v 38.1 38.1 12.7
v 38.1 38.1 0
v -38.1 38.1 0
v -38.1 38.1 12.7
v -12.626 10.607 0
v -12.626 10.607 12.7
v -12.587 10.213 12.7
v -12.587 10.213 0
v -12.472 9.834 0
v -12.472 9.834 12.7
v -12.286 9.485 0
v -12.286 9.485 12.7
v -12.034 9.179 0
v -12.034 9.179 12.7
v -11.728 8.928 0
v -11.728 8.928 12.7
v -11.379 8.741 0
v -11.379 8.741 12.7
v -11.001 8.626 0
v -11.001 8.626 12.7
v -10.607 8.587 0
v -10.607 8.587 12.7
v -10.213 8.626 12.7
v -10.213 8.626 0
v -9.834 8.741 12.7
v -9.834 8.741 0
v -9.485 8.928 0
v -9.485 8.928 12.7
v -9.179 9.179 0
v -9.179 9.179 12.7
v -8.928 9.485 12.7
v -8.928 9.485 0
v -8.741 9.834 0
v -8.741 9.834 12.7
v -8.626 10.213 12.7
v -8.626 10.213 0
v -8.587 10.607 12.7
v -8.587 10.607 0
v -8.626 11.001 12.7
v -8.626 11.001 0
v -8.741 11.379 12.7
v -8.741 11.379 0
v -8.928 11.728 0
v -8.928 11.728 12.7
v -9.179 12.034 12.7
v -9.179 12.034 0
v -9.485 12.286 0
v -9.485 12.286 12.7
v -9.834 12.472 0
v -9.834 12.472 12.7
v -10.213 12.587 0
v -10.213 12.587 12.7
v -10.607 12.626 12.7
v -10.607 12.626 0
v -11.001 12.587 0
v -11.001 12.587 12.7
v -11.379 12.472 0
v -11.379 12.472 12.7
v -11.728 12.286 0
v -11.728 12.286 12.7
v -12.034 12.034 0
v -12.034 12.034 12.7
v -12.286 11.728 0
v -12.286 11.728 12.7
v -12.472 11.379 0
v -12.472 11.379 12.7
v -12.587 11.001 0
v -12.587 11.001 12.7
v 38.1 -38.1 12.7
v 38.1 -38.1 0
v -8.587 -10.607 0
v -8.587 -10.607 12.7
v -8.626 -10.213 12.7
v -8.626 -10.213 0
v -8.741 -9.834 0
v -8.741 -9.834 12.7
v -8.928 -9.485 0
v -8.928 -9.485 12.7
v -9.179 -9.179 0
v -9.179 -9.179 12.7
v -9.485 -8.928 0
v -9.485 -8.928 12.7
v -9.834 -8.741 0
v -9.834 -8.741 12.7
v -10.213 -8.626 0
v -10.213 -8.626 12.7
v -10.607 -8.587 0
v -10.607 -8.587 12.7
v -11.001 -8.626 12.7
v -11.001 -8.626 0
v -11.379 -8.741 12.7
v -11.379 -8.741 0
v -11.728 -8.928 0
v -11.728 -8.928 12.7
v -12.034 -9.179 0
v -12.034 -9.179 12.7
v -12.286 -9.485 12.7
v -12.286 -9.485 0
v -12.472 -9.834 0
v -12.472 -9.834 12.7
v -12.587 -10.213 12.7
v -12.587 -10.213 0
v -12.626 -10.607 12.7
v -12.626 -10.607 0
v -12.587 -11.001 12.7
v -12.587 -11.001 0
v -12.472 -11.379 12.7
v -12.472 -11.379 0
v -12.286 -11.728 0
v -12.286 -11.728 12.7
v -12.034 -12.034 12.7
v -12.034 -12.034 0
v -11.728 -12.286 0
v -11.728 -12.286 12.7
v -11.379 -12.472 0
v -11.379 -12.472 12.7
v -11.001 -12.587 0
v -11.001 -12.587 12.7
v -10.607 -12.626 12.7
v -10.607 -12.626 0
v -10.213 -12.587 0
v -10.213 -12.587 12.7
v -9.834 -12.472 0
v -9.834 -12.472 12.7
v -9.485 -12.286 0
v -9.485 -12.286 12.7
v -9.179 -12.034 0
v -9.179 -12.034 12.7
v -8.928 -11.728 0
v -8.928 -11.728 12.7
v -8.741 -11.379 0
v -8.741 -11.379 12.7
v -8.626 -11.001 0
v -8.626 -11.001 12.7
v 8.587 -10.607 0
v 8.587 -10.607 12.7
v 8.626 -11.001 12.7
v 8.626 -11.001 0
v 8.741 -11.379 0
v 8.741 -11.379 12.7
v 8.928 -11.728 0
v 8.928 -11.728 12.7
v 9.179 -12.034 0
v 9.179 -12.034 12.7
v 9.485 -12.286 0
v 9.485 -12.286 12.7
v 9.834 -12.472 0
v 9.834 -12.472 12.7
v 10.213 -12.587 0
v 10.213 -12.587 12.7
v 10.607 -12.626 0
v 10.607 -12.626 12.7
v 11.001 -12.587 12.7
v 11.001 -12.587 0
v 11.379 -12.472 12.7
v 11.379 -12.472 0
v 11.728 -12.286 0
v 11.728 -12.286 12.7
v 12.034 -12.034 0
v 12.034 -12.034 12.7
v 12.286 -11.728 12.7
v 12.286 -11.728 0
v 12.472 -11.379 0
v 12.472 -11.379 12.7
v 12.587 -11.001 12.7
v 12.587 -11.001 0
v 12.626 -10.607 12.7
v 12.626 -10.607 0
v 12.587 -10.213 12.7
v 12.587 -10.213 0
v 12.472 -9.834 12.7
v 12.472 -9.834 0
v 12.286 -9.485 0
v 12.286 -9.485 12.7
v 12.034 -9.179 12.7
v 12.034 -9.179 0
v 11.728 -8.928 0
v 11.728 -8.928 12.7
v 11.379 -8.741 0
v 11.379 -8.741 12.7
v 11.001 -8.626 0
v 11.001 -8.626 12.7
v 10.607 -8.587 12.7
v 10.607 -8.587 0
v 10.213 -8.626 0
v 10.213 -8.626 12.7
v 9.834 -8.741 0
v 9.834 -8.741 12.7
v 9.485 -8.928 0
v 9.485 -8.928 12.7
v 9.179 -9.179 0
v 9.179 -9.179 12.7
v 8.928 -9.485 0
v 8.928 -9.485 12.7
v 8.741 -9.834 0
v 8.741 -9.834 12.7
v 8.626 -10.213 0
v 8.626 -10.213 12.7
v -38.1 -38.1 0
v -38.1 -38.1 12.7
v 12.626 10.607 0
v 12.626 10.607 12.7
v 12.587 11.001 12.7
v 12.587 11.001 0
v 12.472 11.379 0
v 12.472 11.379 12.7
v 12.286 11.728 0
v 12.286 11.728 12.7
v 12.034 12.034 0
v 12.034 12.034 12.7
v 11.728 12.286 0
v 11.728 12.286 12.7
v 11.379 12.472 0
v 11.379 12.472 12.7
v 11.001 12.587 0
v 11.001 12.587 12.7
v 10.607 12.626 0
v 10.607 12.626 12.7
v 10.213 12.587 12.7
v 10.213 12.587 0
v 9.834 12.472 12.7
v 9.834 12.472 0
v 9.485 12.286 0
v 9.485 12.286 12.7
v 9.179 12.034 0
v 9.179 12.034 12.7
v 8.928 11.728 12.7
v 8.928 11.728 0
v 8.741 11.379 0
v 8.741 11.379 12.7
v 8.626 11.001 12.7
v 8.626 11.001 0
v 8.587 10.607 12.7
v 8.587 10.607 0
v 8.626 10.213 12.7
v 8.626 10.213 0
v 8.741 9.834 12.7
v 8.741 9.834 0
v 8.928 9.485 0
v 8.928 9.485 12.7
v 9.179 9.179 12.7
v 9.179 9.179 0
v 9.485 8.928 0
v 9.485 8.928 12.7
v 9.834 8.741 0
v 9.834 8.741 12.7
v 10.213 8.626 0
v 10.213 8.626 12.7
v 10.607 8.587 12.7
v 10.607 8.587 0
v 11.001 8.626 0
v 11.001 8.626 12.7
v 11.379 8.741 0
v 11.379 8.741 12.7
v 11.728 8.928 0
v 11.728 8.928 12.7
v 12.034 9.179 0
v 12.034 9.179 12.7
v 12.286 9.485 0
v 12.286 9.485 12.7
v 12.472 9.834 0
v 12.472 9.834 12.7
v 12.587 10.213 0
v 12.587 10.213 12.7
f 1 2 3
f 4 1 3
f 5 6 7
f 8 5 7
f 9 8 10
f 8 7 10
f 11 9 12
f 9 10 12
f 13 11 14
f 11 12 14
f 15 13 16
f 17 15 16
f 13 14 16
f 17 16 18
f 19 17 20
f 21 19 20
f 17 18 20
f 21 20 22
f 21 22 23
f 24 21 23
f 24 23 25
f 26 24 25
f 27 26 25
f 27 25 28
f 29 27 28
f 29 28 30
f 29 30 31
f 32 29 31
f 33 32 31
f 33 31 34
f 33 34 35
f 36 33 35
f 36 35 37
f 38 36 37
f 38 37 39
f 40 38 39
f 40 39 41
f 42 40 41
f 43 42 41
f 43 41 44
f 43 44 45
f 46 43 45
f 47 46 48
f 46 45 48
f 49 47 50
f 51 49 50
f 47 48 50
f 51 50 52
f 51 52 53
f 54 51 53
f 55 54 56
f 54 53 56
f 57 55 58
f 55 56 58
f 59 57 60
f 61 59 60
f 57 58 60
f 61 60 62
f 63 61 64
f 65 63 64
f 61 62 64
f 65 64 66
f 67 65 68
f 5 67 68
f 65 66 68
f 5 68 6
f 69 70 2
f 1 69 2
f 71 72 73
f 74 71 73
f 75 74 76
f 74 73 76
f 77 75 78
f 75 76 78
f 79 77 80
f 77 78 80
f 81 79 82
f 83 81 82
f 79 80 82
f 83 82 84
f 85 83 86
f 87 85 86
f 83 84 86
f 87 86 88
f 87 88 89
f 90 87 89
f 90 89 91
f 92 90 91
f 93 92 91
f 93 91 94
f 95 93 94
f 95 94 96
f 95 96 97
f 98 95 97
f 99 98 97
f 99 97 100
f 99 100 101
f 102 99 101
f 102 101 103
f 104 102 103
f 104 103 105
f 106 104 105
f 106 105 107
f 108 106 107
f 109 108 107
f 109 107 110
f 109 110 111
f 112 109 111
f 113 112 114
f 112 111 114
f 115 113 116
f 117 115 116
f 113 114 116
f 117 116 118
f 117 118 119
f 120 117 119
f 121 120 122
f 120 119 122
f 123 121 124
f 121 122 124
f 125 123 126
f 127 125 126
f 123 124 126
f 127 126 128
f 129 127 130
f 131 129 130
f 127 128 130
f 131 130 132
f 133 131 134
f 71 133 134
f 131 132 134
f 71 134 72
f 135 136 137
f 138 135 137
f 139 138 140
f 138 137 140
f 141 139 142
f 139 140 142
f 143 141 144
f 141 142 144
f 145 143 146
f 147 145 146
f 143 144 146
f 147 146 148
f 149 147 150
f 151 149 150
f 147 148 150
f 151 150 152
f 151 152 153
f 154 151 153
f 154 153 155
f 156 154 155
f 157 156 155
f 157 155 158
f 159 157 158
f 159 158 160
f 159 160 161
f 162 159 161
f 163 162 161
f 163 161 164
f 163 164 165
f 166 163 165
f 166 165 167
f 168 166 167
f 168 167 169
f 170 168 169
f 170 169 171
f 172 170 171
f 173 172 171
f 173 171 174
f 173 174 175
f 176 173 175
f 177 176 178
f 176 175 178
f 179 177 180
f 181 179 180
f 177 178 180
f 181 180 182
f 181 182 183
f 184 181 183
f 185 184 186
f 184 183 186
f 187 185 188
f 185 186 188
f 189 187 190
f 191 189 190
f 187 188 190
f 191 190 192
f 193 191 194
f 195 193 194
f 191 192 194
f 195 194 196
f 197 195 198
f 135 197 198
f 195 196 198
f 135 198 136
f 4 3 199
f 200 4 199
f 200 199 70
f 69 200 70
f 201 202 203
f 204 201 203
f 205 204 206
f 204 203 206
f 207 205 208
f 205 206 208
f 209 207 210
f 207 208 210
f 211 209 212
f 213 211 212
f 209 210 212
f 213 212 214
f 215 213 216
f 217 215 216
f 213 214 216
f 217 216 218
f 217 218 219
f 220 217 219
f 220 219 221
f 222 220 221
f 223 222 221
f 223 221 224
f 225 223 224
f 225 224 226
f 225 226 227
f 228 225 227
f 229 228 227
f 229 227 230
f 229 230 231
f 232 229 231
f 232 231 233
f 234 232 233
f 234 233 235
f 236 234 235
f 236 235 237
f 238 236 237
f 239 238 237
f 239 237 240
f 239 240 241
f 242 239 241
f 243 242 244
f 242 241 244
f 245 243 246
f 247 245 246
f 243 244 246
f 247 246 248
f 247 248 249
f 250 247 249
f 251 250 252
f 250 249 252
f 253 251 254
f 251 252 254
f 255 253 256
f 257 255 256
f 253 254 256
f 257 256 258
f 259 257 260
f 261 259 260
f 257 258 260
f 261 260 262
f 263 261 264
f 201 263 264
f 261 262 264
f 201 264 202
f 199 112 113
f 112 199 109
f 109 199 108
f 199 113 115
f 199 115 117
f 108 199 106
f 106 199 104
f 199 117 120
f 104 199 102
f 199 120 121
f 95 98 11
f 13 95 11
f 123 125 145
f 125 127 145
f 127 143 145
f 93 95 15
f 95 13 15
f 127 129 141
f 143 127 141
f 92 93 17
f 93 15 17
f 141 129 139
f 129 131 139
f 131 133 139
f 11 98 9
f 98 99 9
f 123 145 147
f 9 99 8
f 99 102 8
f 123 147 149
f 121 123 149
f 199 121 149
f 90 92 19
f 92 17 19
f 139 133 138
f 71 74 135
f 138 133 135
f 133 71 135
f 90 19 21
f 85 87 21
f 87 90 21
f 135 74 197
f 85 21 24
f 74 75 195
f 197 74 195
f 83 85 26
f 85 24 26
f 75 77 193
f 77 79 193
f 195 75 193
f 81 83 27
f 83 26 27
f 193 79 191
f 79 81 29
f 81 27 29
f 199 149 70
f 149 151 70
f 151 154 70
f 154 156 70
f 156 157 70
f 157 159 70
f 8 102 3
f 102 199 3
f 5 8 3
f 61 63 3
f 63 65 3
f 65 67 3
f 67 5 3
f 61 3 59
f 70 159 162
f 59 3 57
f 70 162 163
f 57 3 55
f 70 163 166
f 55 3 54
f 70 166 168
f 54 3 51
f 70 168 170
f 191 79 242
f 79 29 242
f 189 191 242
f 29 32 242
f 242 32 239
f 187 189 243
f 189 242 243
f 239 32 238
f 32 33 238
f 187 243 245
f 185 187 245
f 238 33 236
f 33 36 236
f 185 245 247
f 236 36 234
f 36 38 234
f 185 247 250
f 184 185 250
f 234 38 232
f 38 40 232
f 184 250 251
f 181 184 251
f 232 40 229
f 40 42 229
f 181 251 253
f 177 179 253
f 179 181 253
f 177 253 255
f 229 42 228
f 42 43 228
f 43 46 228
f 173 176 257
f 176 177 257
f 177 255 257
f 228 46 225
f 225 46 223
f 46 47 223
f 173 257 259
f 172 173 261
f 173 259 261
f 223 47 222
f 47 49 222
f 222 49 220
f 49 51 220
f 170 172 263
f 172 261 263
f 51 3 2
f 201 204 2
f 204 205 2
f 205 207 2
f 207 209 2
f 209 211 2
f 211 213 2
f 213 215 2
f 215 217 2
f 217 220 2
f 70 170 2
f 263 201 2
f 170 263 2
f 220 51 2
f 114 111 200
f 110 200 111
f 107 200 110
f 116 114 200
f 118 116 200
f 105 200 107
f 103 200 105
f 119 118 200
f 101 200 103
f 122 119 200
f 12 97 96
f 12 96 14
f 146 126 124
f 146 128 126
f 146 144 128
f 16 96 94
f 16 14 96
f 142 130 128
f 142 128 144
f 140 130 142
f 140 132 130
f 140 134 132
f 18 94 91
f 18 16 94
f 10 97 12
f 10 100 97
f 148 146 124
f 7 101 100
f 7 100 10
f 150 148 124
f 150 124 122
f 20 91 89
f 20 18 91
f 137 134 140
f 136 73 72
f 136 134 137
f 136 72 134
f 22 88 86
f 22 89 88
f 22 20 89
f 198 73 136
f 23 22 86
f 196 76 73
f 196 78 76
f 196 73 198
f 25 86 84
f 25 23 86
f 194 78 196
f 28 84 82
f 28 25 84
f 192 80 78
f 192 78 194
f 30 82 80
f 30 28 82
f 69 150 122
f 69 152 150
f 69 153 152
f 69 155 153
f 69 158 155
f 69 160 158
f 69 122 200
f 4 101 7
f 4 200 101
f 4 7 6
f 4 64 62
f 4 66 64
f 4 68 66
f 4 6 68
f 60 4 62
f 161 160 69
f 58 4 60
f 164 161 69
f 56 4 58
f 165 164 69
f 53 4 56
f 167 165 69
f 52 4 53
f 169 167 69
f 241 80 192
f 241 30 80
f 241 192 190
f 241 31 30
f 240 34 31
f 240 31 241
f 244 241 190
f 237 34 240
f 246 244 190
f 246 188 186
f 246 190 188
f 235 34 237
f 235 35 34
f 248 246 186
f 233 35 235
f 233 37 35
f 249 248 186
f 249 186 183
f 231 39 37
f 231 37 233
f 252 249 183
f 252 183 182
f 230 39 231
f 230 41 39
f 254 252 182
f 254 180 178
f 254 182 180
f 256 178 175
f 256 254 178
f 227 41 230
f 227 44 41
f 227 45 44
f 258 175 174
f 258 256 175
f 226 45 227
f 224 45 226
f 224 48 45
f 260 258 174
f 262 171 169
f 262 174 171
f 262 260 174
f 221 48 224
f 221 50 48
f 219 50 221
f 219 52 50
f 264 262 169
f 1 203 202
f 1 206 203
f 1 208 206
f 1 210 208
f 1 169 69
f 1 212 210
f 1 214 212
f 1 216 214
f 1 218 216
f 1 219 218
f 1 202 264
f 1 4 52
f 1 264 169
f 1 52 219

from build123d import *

# Parameters (mm, degrees)
BOSS_EXTRUDE1_DEPTH = 12.7
SKETCH2_R           = 2.0193
CUT_EXTRUDE1_DEPTH  = 56.358016583


with BuildPart() as part:
    # Sketch1 → Boss-Extrude1 (new body)
    with BuildSketch(Plane.XY):
        Polygon((-38.1, 38.1), (-38.1, -38.1), (-12.7, -38.1), (12.7, -38.1), (38.1, -38.1), (38.1, 38.1), (12.7, 38.1), (-12.7, 38.1), align=None)
    extrude(amount=BOSS_EXTRUDE1_DEPTH)

    # Sketch2 → Cut-Extrude1 (cut, through all)
    with BuildSketch(Plane.XY.offset(12.7)):
        with Locations((10.606601718, 10.606601718)):
            Circle(SKETCH2_R)
        with Locations(Location((10.606601718, -10.606601718, 0), (0, 0, 180))):
            Circle(SKETCH2_R)
        with Locations((-10.606601718, -10.606601718)):
            Circle(SKETCH2_R)
        with Locations(Location((-10.606601718, 10.606601718, 0), (0, 0, 180))):
            Circle(SKETCH2_R)
    extrude(amount=-CUT_EXTRUDE1_DEPTH, mode=Mode.SUBTRACT)


solid = part.part
